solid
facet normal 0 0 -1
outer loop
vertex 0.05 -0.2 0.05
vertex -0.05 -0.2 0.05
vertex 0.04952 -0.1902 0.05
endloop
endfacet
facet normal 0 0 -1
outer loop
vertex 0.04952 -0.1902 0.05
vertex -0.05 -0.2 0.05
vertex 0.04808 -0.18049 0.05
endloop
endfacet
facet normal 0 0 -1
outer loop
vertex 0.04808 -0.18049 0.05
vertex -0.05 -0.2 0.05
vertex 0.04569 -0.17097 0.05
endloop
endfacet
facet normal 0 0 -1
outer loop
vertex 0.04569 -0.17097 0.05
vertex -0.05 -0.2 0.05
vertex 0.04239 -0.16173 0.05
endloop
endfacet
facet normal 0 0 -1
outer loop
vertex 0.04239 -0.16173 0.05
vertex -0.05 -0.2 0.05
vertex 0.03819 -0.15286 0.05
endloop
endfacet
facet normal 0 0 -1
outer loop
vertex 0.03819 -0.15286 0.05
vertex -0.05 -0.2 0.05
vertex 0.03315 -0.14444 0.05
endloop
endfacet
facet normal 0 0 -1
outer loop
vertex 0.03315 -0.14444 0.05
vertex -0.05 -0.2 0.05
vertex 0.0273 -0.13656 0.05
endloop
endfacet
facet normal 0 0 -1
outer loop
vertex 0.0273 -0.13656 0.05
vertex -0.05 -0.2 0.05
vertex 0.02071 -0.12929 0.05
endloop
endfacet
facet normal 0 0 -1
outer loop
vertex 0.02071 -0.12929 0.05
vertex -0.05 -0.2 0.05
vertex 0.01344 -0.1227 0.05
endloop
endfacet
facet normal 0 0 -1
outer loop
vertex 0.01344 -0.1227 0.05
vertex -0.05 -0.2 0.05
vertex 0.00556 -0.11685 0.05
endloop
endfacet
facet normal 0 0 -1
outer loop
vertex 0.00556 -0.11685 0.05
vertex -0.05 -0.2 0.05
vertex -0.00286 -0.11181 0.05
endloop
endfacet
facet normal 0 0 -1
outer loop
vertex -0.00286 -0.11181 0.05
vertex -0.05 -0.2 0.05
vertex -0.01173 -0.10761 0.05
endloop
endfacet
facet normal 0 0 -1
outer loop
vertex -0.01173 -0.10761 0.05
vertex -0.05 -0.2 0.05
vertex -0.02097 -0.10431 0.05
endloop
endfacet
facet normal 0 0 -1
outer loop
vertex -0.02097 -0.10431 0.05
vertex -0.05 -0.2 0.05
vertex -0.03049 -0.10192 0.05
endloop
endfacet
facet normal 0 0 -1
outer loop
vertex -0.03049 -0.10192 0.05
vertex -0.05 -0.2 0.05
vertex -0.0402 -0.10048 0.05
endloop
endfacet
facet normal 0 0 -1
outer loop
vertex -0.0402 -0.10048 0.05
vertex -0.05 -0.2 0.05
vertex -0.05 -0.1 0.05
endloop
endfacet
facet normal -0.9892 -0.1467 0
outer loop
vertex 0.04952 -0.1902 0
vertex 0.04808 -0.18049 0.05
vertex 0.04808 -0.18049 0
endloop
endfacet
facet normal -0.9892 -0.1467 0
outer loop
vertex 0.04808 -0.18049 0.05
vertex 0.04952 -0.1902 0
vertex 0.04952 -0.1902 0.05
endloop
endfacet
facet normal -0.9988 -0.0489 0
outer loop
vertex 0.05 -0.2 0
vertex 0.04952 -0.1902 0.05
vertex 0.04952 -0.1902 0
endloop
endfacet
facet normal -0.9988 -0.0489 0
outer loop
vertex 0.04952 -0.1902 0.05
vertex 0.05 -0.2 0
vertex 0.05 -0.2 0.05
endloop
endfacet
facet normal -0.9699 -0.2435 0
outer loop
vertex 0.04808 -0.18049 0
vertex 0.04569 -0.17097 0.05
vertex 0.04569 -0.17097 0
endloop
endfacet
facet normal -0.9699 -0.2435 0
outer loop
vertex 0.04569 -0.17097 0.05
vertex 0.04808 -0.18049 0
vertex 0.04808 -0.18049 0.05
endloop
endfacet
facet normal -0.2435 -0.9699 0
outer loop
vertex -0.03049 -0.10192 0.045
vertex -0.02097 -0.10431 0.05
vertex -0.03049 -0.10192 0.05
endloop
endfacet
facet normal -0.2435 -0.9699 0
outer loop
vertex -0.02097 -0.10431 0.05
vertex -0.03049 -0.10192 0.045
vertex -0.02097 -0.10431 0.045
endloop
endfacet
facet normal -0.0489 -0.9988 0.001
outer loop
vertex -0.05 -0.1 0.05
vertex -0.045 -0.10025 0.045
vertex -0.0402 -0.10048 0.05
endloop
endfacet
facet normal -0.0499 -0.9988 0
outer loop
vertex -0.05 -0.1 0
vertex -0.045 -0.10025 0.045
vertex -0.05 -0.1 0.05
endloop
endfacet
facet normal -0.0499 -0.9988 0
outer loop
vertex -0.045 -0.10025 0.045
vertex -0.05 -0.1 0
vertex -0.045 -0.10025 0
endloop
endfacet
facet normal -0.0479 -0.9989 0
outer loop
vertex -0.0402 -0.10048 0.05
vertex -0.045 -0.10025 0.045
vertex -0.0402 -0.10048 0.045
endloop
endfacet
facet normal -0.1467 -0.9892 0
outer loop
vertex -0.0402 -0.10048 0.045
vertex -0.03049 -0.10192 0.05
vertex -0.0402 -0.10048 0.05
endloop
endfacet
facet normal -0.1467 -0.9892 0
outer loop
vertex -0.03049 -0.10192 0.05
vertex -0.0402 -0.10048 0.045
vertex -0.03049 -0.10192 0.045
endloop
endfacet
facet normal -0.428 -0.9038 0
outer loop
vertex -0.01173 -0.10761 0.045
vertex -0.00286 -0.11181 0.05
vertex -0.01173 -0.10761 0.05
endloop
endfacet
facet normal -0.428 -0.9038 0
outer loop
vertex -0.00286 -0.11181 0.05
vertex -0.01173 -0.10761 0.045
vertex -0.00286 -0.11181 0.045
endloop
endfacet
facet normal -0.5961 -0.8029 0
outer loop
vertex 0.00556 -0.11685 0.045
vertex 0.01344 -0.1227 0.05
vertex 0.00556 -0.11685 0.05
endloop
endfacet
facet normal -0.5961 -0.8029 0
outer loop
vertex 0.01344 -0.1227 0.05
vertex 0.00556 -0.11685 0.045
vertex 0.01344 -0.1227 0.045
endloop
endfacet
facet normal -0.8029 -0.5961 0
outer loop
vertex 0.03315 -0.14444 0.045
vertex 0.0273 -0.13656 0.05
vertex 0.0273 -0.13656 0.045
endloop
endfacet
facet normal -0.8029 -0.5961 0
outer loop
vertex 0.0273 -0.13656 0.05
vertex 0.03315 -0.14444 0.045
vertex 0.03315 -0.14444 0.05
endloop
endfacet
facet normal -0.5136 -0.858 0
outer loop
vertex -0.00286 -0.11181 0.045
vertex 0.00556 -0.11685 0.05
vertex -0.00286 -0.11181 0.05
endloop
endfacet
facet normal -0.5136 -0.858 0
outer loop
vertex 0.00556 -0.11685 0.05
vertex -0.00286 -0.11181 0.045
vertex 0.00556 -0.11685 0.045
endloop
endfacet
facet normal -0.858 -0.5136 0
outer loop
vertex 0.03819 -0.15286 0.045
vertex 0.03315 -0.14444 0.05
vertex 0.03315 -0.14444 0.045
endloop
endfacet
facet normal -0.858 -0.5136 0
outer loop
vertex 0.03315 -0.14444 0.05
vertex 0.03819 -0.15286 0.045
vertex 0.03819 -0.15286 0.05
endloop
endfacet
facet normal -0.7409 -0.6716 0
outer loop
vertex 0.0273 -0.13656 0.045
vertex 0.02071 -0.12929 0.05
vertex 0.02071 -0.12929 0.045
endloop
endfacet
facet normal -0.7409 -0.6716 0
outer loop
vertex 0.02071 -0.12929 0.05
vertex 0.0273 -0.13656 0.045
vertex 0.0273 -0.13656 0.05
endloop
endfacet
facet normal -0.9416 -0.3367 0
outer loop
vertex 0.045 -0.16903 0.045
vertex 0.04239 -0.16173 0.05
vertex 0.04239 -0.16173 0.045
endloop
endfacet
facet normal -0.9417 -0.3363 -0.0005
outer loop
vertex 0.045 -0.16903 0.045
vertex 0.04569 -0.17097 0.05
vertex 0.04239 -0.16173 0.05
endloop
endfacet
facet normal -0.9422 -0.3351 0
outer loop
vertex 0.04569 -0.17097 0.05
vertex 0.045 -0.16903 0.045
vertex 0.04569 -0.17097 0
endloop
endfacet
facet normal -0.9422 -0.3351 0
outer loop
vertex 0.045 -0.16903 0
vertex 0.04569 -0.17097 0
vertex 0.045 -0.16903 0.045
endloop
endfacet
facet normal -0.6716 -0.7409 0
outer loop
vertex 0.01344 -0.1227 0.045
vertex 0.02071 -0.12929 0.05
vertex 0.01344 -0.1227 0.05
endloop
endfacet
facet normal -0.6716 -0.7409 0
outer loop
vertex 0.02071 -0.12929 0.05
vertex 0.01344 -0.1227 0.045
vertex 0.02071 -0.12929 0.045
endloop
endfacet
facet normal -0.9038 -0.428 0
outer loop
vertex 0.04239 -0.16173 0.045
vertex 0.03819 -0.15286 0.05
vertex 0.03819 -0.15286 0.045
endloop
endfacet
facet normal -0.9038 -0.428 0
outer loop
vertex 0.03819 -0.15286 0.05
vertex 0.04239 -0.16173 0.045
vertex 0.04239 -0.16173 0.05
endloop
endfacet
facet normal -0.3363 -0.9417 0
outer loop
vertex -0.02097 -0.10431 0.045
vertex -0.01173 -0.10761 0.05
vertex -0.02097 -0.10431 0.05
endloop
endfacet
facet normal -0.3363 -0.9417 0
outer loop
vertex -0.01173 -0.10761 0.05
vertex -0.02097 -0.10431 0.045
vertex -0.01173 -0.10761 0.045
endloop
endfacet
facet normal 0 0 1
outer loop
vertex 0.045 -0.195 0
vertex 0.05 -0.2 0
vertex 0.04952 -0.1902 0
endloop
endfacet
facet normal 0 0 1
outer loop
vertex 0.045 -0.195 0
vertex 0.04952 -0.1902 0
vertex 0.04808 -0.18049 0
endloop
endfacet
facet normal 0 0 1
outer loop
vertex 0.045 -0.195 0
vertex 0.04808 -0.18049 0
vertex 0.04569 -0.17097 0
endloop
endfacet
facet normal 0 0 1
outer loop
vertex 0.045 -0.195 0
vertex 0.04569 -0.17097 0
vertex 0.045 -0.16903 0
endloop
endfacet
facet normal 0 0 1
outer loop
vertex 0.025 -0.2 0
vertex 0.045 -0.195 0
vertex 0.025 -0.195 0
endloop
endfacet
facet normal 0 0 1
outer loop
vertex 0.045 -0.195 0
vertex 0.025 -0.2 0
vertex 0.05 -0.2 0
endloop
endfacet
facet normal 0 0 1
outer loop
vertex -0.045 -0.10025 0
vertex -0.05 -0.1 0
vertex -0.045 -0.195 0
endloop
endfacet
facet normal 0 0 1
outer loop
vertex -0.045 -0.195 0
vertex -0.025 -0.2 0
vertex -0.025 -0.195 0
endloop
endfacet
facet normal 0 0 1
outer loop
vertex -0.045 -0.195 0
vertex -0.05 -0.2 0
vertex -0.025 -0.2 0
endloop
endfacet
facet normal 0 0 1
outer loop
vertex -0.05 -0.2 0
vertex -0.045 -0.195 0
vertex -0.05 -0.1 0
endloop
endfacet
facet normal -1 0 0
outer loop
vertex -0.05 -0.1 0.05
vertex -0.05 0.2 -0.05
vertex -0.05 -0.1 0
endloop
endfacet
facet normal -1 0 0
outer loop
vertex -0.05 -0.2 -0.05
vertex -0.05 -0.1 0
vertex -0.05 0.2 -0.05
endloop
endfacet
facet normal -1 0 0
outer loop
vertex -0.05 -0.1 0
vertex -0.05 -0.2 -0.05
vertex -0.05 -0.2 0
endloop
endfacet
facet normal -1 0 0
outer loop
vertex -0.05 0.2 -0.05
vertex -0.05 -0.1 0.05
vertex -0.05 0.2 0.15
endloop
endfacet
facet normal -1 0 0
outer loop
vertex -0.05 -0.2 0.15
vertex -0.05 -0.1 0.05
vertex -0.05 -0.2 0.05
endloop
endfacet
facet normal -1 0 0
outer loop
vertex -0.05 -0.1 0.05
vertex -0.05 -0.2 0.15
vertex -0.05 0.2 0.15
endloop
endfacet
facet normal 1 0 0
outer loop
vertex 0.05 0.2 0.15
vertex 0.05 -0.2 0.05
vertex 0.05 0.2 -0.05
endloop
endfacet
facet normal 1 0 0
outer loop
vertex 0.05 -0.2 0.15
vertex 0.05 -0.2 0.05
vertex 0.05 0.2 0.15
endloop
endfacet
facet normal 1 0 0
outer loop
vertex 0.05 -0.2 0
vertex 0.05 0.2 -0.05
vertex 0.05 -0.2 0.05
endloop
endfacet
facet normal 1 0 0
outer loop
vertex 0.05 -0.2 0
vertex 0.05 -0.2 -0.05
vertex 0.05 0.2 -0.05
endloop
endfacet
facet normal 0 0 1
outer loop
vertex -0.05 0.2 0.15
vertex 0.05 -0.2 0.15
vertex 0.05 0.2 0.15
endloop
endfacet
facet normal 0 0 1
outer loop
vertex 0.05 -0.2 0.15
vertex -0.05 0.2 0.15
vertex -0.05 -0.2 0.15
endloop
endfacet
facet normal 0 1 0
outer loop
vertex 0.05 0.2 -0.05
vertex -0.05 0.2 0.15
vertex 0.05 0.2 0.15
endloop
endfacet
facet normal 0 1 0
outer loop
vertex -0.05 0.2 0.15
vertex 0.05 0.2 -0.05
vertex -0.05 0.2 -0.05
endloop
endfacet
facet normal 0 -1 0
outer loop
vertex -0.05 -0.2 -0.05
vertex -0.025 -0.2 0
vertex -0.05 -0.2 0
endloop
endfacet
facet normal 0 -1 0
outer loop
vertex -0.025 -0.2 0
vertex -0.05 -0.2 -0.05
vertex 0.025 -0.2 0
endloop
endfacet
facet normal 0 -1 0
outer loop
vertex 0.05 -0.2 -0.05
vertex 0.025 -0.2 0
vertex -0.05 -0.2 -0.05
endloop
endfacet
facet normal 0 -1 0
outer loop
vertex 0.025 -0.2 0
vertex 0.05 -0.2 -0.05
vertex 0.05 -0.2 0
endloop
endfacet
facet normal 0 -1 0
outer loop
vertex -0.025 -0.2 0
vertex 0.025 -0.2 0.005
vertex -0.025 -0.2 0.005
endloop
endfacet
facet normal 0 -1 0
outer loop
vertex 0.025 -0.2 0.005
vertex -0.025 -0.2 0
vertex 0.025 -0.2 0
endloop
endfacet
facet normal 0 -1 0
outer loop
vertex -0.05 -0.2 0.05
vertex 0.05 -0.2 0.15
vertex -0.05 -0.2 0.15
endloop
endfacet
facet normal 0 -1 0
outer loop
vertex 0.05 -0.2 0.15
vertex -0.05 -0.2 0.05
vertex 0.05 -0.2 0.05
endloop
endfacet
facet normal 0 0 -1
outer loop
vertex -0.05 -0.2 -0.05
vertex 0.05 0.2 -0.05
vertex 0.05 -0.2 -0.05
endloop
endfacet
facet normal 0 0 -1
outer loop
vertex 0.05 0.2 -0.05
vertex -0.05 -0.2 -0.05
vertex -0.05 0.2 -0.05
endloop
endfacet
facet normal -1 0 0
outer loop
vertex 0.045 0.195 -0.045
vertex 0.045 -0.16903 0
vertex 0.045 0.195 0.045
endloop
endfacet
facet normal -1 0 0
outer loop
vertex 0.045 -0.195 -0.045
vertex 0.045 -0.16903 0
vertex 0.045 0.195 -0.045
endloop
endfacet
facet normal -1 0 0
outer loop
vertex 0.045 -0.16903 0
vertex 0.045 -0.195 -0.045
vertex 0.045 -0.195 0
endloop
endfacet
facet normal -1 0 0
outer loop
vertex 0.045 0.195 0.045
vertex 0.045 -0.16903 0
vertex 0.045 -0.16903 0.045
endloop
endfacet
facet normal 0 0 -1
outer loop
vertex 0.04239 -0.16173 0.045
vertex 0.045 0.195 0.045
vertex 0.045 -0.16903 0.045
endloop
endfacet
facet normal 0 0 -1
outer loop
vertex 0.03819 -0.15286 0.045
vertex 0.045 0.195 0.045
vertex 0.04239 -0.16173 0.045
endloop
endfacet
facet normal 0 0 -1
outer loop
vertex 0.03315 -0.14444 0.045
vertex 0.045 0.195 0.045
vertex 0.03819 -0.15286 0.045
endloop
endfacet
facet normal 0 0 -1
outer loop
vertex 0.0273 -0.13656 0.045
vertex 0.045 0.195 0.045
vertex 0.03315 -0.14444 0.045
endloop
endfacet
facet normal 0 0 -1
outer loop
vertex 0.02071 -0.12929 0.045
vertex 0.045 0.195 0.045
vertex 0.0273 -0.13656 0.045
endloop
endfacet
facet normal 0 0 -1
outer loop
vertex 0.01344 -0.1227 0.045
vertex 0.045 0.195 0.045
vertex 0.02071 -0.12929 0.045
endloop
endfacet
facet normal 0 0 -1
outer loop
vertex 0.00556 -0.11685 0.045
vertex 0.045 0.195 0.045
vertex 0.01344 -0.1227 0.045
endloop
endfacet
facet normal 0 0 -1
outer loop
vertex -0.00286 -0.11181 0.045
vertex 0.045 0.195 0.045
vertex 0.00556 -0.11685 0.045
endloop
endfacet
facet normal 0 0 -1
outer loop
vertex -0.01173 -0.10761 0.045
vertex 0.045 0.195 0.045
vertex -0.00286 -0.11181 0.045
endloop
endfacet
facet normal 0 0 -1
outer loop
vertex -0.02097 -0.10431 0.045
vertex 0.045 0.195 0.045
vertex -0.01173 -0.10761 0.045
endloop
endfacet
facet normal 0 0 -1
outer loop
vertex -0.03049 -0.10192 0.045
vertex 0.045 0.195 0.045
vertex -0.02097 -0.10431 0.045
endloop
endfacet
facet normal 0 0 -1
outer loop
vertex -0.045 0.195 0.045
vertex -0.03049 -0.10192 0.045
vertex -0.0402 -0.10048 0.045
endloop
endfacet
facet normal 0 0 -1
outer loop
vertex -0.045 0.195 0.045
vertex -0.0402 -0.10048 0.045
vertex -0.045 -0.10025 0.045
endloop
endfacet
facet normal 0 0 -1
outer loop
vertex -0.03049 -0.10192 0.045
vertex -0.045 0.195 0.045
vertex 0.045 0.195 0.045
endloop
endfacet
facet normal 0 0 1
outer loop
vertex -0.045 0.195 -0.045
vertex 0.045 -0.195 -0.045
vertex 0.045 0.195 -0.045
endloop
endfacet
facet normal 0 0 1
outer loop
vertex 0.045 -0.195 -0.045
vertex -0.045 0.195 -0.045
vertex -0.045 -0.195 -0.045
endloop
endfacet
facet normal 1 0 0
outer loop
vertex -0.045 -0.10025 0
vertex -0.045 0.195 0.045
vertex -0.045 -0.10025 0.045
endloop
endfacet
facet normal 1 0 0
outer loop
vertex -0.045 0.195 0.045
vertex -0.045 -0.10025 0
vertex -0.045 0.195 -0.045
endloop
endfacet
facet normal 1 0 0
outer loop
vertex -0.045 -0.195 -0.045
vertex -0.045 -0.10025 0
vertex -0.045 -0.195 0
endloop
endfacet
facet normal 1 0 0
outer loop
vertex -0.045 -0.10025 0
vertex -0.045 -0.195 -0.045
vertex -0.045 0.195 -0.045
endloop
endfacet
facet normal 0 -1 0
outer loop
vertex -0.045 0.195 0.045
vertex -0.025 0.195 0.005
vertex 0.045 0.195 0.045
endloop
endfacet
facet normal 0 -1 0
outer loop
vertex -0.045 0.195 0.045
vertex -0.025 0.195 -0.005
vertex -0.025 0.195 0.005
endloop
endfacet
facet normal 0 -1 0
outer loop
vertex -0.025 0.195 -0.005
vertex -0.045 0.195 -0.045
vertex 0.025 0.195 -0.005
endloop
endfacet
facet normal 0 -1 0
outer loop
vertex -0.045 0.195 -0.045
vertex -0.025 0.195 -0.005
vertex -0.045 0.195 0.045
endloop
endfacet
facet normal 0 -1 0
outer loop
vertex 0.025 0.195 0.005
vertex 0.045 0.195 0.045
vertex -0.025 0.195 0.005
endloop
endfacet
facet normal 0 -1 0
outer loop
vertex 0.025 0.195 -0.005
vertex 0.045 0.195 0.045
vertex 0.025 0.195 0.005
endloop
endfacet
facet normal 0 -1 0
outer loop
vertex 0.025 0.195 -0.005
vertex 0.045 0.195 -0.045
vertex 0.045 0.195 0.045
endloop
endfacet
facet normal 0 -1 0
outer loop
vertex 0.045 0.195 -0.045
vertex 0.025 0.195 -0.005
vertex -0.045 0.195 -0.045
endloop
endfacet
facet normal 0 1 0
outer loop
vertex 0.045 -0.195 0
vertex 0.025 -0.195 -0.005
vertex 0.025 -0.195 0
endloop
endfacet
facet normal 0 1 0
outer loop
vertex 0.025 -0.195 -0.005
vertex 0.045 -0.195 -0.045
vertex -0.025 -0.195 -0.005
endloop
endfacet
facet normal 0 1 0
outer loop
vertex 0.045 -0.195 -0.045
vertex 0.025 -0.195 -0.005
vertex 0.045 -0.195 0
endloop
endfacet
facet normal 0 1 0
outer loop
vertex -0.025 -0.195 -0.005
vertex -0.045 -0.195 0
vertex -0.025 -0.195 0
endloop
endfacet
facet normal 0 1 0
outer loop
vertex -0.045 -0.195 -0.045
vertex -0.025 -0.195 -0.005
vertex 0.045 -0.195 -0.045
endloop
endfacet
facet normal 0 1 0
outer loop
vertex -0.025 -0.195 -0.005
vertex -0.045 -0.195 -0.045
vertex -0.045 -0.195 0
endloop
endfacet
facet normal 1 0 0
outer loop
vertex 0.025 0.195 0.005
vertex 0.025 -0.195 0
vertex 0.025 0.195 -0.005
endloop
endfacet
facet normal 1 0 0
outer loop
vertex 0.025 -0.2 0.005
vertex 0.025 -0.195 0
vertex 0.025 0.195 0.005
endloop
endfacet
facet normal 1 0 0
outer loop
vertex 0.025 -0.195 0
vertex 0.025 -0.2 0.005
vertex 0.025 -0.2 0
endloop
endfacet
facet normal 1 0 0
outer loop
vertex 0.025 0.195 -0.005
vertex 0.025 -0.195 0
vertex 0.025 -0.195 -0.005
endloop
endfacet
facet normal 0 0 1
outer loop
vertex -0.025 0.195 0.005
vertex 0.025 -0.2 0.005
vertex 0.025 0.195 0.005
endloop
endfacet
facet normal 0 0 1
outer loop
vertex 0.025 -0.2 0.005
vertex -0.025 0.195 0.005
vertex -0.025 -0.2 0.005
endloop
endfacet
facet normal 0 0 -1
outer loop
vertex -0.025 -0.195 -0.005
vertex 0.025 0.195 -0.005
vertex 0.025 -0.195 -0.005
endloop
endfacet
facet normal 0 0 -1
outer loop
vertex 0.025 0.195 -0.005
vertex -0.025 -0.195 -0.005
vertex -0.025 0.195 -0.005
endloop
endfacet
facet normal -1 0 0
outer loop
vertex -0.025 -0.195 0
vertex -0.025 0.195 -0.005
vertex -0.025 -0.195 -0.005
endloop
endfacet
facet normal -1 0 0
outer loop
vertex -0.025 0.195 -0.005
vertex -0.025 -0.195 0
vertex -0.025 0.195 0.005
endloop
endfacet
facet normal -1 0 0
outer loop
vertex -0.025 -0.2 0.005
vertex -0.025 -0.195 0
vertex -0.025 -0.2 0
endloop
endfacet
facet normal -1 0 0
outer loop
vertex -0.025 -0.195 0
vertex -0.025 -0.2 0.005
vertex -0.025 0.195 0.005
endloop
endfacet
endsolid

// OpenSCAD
module chamfered_bar() {
    difference() {
        // Main bar with chamfered edges
        hull() {
            translate([-0.05, -0.2, -0.05])
                cube([0.1, 0.4, 0.1]);
            translate([-0.05, -0.2, 0.05])
                cube([0.1, 0.4, 0.1]);
        }
        
        // Recessed panel on broad faces
        translate([-0.045, -0.195, -0.045])
            cube([0.09, 0.39, 0.09]);
        
        // Concave curvature on top and bottom
        translate([-0.05, -0.2, -0.05])
            intersection() {
                cube([0.1, 0.4, 0.1]);
                translate([0, 0, 0.05])
                    scale([1, 1, 0.5])
                    cylinder(h=0.1, r=0.1, $fn=64);
            }
        translate([-0.05, -0.2, -0.05])
            intersection() {
                cube([0.1, 0.4, 0.1]);
                translate([0, 0, -0.05])
                    scale([1, 1, 0.5])
                    cylinder(h=0.1, r=0.1, $fn=64);
            }
    }
    
    // Central rib/step
    translate([-0.025, -0.2, -0.005])
        cube([0.05, 0.4, 0.01]);
}

chamfered_bar();
